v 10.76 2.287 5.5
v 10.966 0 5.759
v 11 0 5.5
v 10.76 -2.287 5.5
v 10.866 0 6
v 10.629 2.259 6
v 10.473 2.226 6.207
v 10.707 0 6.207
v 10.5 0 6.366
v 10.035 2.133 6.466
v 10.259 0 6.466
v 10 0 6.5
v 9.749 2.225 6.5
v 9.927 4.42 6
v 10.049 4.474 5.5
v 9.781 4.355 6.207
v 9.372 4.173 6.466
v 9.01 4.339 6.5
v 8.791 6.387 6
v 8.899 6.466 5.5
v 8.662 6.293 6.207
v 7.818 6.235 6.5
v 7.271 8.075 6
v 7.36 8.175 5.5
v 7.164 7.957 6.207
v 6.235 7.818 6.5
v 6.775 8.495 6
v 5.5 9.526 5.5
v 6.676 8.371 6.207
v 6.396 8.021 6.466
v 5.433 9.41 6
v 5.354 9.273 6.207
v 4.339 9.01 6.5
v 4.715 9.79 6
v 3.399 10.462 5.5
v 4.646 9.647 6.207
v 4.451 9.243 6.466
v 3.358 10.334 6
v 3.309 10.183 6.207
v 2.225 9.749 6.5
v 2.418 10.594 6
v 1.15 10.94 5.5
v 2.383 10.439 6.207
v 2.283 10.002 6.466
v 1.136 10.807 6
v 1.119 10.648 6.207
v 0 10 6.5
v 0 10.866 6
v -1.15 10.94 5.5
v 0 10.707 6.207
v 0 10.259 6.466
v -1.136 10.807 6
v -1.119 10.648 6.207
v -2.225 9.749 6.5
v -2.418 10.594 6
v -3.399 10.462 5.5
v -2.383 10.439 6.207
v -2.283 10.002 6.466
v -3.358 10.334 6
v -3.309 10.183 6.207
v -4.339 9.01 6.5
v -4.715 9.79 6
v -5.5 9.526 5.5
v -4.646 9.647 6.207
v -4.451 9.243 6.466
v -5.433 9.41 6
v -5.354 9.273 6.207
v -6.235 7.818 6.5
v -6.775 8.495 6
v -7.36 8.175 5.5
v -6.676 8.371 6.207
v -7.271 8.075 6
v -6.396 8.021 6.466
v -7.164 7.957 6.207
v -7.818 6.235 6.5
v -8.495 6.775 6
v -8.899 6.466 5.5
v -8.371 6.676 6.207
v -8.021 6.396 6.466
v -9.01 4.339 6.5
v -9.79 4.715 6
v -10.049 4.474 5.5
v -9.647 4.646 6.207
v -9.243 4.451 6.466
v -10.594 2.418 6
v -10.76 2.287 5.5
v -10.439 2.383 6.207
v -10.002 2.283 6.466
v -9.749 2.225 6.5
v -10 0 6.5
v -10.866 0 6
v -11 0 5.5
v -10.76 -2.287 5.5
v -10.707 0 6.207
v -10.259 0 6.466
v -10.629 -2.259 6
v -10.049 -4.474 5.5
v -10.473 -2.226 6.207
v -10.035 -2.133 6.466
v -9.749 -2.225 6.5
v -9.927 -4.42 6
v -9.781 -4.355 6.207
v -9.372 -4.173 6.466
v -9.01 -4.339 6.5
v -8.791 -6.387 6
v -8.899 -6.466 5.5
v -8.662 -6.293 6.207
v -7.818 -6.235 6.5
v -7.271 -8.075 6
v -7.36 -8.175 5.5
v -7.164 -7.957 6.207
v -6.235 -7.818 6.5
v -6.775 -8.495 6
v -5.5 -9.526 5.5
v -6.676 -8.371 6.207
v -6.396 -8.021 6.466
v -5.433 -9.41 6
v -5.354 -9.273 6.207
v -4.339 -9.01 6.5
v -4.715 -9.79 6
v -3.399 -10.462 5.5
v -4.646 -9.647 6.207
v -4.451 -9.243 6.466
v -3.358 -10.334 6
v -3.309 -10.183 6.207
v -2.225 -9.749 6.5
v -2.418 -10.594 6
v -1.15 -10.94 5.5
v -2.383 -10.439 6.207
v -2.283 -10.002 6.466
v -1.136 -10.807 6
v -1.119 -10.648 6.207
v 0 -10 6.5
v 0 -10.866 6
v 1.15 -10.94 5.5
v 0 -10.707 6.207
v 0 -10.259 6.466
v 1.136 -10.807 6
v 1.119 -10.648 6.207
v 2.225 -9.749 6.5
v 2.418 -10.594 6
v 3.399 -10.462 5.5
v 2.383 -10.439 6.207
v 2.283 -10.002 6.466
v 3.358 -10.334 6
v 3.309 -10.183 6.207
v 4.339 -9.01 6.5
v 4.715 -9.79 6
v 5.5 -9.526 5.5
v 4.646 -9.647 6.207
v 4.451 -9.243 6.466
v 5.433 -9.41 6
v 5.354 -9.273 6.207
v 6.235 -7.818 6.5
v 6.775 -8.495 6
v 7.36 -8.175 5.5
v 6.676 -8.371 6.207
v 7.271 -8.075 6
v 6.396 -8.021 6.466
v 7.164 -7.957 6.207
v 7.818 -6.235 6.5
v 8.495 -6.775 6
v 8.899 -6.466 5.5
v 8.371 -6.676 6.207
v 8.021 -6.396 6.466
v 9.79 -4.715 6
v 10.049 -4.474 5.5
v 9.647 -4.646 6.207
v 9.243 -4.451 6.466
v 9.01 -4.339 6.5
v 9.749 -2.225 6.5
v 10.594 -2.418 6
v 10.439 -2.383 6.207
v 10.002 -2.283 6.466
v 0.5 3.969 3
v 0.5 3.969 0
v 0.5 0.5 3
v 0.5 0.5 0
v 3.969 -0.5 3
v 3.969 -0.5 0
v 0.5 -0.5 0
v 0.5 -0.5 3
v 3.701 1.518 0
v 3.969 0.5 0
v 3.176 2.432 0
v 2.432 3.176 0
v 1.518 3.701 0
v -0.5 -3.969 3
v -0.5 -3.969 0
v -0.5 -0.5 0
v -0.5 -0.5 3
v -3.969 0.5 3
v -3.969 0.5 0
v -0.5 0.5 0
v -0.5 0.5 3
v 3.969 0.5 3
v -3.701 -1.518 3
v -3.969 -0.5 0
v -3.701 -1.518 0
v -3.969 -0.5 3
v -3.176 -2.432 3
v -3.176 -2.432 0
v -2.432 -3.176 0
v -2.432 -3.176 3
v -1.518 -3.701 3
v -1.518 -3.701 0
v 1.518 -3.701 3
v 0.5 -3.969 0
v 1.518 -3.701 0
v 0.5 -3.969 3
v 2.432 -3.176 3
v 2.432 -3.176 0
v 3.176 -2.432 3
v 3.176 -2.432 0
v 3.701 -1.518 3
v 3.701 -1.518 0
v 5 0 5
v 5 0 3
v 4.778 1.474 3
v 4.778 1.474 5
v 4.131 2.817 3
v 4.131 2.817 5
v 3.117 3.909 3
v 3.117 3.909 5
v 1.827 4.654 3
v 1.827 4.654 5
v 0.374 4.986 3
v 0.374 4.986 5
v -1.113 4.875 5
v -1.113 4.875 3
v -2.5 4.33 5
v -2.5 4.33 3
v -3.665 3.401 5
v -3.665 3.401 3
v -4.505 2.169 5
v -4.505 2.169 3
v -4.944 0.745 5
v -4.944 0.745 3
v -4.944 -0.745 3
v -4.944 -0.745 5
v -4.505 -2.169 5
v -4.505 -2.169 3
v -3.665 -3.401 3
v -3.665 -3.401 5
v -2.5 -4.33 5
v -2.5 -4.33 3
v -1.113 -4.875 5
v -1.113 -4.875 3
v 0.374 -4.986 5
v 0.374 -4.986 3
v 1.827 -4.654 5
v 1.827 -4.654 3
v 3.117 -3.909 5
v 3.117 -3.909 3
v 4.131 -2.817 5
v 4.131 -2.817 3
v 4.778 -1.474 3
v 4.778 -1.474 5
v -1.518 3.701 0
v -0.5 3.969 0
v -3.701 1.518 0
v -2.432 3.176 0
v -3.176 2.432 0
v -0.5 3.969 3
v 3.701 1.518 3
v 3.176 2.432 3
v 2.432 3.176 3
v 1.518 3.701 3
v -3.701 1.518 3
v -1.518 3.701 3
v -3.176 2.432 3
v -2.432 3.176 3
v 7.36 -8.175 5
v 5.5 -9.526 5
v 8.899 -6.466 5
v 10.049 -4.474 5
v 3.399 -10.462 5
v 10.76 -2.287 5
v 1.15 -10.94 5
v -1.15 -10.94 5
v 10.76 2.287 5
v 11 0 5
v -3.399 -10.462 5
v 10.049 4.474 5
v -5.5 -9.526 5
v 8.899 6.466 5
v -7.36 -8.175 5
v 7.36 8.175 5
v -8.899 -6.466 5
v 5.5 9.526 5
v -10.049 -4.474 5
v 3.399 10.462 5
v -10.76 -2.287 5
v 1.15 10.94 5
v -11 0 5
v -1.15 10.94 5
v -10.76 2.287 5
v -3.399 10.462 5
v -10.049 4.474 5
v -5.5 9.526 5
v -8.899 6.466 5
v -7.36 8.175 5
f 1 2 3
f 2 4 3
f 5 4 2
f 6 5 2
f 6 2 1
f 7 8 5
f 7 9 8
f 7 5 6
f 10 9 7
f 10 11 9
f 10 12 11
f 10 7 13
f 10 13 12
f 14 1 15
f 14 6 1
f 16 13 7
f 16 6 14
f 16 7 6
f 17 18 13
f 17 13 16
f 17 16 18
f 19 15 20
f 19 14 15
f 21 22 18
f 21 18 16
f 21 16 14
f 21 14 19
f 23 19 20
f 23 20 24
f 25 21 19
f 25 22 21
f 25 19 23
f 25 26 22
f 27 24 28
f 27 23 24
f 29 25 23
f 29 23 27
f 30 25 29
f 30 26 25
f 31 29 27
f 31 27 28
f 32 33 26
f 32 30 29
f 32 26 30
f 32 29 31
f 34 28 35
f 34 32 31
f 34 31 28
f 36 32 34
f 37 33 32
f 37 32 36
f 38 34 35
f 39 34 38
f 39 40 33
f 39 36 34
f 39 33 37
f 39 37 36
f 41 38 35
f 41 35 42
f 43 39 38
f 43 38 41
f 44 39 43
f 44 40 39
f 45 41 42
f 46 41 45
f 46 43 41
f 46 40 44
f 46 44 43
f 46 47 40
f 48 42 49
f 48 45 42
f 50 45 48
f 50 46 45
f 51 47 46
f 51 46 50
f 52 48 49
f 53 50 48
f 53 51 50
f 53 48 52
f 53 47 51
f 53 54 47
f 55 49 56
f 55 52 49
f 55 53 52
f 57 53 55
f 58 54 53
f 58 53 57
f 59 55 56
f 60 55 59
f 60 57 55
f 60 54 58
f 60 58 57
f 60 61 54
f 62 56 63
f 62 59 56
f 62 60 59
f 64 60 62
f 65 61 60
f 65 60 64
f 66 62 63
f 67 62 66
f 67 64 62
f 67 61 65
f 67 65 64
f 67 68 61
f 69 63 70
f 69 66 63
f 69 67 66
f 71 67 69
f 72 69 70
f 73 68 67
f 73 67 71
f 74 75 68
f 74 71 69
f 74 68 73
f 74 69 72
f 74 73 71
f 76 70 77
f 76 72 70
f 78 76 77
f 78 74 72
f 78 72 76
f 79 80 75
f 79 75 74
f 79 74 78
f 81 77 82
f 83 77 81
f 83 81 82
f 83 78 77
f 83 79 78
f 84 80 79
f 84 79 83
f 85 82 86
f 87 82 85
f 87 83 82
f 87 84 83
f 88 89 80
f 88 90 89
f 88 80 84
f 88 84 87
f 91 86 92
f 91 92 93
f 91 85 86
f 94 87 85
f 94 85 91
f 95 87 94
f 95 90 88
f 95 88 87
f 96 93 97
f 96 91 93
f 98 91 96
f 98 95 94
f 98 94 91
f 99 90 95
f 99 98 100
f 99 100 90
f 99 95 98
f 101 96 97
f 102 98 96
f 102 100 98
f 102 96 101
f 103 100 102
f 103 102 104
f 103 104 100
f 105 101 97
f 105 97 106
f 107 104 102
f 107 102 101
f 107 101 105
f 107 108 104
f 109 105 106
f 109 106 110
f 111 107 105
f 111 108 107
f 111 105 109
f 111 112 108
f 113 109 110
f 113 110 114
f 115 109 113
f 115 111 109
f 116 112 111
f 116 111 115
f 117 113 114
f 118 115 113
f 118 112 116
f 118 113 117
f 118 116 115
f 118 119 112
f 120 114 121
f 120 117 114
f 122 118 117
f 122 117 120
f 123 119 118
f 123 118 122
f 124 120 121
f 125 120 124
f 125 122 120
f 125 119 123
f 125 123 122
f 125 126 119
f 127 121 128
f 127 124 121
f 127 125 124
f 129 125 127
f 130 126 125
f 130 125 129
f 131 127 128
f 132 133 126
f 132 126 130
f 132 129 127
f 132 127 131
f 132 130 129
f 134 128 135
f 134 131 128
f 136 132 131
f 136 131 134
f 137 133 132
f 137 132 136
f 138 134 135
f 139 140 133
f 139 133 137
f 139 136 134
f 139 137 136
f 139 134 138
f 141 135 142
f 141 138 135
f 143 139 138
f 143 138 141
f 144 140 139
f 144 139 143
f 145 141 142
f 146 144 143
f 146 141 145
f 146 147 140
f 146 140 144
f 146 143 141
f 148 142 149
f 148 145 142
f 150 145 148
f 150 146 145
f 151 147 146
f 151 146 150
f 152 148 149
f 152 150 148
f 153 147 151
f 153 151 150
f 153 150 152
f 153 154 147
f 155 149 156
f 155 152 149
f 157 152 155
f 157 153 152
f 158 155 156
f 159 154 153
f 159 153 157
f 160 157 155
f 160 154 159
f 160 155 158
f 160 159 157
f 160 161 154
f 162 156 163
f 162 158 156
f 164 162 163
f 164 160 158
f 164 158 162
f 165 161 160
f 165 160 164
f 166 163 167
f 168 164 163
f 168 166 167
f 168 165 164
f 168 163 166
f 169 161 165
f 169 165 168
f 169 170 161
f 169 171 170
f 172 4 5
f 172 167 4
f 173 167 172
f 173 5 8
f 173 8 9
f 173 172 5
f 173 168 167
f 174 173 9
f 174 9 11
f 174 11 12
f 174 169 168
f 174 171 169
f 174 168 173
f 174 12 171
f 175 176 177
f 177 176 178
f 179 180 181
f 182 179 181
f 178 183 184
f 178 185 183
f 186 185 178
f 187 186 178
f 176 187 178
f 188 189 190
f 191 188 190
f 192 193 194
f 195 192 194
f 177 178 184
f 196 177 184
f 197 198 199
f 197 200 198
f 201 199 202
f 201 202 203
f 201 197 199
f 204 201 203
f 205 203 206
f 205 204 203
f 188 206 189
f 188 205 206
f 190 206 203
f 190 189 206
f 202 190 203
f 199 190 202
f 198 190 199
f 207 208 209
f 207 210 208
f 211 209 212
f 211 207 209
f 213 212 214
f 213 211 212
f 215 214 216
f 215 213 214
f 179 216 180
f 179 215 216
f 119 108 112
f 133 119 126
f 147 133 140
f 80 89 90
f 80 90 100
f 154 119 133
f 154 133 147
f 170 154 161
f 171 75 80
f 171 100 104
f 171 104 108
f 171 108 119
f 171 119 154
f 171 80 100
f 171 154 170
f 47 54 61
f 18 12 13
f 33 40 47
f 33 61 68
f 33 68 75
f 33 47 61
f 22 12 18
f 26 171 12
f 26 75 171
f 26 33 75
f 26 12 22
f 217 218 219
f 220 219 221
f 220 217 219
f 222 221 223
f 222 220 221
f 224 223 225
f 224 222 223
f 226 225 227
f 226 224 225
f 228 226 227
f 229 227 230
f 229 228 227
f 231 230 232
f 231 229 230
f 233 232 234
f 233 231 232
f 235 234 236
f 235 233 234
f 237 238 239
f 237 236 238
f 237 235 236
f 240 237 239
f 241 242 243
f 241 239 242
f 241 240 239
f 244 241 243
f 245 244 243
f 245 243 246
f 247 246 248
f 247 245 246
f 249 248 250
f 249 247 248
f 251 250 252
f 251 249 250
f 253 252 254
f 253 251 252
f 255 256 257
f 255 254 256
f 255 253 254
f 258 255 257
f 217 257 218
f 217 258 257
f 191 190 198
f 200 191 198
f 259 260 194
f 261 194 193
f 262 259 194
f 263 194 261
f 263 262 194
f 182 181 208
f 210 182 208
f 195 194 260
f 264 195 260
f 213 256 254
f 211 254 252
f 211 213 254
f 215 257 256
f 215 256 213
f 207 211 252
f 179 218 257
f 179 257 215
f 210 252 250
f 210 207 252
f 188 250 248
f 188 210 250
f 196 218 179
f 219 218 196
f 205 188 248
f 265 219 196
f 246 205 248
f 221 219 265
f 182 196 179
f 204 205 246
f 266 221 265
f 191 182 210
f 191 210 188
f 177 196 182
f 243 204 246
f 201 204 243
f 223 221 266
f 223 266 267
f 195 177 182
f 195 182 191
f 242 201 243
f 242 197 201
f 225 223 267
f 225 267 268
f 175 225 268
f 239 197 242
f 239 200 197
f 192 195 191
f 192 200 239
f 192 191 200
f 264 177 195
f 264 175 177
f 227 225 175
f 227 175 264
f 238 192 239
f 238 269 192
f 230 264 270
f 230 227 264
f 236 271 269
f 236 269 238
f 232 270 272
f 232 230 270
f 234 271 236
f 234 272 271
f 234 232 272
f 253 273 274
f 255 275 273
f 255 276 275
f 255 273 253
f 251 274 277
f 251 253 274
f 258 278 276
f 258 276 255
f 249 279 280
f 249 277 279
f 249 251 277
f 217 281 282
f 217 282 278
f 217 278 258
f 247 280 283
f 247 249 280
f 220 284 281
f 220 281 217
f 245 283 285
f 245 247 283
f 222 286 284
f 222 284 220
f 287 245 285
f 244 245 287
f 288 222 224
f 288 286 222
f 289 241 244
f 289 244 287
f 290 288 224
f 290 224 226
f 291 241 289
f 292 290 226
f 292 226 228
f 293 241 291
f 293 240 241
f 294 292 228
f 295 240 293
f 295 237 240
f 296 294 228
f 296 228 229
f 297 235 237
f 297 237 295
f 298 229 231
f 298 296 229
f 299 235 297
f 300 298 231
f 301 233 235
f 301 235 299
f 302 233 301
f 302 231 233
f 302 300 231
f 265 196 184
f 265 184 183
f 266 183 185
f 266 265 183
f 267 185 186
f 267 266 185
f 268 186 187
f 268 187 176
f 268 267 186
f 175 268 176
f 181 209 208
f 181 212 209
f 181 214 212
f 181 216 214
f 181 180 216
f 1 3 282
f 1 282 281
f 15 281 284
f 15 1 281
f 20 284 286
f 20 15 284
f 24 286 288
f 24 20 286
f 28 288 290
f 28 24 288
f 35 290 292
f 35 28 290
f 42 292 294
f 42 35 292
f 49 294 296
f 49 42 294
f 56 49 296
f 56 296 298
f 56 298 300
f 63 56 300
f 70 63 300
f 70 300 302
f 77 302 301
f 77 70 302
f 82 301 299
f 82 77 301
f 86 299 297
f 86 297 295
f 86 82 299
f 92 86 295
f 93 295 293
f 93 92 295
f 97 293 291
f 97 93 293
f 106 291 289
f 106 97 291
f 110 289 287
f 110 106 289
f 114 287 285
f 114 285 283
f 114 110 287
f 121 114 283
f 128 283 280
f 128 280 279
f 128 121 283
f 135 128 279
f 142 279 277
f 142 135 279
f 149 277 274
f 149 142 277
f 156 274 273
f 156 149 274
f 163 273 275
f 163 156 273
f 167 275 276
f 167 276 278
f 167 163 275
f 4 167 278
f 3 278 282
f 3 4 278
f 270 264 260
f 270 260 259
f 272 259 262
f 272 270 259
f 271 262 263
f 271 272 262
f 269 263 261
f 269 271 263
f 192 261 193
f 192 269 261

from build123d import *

# Parameters (mm, degrees)
F3_DEPTH = 3
F4_R     = 1


with BuildPart() as f1:
    # F0 (on Front) → F1 (revolve)
    with BuildSketch(Plane.XZ):
        Polygon((0, 6.5), (0, 0), (4, 0), (4, 3), (5, 3), (5, 5), (11, 5), (11, 6.5), align=None)
    revolve(axis=Axis((0, 0, 5.302473), (0, 0, 1)))

    # F2 (on face) → F3 (cut, through all)
    with BuildSketch(Plane(origin=(0, 0, 0), x_dir=(1, 0, 0), z_dir=(0, 0, -1))):
        Polygon((-0.5, -6.403249), (0.5, -6.403249), (0.5, -0.5), (5.621079, -0.5), (5.621079, 0.5), (0.5, 0.5), (0.5, 6.403249), (-0.5, 6.403249), (-0.5, 0.5), (-5.621079, 0.5), (-5.621079, -0.5), (-0.5, -0.5), align=None)
    extrude(amount=-F3_DEPTH, mode=Mode.SUBTRACT)

    # F4
    f4_edges = [f1.edges().sort_by_distance(p)[0] for p in [
        (-11, 0, 6.5),
    ]]
    fillet(f4_edges, radius=F4_R)


solid = f1.part
